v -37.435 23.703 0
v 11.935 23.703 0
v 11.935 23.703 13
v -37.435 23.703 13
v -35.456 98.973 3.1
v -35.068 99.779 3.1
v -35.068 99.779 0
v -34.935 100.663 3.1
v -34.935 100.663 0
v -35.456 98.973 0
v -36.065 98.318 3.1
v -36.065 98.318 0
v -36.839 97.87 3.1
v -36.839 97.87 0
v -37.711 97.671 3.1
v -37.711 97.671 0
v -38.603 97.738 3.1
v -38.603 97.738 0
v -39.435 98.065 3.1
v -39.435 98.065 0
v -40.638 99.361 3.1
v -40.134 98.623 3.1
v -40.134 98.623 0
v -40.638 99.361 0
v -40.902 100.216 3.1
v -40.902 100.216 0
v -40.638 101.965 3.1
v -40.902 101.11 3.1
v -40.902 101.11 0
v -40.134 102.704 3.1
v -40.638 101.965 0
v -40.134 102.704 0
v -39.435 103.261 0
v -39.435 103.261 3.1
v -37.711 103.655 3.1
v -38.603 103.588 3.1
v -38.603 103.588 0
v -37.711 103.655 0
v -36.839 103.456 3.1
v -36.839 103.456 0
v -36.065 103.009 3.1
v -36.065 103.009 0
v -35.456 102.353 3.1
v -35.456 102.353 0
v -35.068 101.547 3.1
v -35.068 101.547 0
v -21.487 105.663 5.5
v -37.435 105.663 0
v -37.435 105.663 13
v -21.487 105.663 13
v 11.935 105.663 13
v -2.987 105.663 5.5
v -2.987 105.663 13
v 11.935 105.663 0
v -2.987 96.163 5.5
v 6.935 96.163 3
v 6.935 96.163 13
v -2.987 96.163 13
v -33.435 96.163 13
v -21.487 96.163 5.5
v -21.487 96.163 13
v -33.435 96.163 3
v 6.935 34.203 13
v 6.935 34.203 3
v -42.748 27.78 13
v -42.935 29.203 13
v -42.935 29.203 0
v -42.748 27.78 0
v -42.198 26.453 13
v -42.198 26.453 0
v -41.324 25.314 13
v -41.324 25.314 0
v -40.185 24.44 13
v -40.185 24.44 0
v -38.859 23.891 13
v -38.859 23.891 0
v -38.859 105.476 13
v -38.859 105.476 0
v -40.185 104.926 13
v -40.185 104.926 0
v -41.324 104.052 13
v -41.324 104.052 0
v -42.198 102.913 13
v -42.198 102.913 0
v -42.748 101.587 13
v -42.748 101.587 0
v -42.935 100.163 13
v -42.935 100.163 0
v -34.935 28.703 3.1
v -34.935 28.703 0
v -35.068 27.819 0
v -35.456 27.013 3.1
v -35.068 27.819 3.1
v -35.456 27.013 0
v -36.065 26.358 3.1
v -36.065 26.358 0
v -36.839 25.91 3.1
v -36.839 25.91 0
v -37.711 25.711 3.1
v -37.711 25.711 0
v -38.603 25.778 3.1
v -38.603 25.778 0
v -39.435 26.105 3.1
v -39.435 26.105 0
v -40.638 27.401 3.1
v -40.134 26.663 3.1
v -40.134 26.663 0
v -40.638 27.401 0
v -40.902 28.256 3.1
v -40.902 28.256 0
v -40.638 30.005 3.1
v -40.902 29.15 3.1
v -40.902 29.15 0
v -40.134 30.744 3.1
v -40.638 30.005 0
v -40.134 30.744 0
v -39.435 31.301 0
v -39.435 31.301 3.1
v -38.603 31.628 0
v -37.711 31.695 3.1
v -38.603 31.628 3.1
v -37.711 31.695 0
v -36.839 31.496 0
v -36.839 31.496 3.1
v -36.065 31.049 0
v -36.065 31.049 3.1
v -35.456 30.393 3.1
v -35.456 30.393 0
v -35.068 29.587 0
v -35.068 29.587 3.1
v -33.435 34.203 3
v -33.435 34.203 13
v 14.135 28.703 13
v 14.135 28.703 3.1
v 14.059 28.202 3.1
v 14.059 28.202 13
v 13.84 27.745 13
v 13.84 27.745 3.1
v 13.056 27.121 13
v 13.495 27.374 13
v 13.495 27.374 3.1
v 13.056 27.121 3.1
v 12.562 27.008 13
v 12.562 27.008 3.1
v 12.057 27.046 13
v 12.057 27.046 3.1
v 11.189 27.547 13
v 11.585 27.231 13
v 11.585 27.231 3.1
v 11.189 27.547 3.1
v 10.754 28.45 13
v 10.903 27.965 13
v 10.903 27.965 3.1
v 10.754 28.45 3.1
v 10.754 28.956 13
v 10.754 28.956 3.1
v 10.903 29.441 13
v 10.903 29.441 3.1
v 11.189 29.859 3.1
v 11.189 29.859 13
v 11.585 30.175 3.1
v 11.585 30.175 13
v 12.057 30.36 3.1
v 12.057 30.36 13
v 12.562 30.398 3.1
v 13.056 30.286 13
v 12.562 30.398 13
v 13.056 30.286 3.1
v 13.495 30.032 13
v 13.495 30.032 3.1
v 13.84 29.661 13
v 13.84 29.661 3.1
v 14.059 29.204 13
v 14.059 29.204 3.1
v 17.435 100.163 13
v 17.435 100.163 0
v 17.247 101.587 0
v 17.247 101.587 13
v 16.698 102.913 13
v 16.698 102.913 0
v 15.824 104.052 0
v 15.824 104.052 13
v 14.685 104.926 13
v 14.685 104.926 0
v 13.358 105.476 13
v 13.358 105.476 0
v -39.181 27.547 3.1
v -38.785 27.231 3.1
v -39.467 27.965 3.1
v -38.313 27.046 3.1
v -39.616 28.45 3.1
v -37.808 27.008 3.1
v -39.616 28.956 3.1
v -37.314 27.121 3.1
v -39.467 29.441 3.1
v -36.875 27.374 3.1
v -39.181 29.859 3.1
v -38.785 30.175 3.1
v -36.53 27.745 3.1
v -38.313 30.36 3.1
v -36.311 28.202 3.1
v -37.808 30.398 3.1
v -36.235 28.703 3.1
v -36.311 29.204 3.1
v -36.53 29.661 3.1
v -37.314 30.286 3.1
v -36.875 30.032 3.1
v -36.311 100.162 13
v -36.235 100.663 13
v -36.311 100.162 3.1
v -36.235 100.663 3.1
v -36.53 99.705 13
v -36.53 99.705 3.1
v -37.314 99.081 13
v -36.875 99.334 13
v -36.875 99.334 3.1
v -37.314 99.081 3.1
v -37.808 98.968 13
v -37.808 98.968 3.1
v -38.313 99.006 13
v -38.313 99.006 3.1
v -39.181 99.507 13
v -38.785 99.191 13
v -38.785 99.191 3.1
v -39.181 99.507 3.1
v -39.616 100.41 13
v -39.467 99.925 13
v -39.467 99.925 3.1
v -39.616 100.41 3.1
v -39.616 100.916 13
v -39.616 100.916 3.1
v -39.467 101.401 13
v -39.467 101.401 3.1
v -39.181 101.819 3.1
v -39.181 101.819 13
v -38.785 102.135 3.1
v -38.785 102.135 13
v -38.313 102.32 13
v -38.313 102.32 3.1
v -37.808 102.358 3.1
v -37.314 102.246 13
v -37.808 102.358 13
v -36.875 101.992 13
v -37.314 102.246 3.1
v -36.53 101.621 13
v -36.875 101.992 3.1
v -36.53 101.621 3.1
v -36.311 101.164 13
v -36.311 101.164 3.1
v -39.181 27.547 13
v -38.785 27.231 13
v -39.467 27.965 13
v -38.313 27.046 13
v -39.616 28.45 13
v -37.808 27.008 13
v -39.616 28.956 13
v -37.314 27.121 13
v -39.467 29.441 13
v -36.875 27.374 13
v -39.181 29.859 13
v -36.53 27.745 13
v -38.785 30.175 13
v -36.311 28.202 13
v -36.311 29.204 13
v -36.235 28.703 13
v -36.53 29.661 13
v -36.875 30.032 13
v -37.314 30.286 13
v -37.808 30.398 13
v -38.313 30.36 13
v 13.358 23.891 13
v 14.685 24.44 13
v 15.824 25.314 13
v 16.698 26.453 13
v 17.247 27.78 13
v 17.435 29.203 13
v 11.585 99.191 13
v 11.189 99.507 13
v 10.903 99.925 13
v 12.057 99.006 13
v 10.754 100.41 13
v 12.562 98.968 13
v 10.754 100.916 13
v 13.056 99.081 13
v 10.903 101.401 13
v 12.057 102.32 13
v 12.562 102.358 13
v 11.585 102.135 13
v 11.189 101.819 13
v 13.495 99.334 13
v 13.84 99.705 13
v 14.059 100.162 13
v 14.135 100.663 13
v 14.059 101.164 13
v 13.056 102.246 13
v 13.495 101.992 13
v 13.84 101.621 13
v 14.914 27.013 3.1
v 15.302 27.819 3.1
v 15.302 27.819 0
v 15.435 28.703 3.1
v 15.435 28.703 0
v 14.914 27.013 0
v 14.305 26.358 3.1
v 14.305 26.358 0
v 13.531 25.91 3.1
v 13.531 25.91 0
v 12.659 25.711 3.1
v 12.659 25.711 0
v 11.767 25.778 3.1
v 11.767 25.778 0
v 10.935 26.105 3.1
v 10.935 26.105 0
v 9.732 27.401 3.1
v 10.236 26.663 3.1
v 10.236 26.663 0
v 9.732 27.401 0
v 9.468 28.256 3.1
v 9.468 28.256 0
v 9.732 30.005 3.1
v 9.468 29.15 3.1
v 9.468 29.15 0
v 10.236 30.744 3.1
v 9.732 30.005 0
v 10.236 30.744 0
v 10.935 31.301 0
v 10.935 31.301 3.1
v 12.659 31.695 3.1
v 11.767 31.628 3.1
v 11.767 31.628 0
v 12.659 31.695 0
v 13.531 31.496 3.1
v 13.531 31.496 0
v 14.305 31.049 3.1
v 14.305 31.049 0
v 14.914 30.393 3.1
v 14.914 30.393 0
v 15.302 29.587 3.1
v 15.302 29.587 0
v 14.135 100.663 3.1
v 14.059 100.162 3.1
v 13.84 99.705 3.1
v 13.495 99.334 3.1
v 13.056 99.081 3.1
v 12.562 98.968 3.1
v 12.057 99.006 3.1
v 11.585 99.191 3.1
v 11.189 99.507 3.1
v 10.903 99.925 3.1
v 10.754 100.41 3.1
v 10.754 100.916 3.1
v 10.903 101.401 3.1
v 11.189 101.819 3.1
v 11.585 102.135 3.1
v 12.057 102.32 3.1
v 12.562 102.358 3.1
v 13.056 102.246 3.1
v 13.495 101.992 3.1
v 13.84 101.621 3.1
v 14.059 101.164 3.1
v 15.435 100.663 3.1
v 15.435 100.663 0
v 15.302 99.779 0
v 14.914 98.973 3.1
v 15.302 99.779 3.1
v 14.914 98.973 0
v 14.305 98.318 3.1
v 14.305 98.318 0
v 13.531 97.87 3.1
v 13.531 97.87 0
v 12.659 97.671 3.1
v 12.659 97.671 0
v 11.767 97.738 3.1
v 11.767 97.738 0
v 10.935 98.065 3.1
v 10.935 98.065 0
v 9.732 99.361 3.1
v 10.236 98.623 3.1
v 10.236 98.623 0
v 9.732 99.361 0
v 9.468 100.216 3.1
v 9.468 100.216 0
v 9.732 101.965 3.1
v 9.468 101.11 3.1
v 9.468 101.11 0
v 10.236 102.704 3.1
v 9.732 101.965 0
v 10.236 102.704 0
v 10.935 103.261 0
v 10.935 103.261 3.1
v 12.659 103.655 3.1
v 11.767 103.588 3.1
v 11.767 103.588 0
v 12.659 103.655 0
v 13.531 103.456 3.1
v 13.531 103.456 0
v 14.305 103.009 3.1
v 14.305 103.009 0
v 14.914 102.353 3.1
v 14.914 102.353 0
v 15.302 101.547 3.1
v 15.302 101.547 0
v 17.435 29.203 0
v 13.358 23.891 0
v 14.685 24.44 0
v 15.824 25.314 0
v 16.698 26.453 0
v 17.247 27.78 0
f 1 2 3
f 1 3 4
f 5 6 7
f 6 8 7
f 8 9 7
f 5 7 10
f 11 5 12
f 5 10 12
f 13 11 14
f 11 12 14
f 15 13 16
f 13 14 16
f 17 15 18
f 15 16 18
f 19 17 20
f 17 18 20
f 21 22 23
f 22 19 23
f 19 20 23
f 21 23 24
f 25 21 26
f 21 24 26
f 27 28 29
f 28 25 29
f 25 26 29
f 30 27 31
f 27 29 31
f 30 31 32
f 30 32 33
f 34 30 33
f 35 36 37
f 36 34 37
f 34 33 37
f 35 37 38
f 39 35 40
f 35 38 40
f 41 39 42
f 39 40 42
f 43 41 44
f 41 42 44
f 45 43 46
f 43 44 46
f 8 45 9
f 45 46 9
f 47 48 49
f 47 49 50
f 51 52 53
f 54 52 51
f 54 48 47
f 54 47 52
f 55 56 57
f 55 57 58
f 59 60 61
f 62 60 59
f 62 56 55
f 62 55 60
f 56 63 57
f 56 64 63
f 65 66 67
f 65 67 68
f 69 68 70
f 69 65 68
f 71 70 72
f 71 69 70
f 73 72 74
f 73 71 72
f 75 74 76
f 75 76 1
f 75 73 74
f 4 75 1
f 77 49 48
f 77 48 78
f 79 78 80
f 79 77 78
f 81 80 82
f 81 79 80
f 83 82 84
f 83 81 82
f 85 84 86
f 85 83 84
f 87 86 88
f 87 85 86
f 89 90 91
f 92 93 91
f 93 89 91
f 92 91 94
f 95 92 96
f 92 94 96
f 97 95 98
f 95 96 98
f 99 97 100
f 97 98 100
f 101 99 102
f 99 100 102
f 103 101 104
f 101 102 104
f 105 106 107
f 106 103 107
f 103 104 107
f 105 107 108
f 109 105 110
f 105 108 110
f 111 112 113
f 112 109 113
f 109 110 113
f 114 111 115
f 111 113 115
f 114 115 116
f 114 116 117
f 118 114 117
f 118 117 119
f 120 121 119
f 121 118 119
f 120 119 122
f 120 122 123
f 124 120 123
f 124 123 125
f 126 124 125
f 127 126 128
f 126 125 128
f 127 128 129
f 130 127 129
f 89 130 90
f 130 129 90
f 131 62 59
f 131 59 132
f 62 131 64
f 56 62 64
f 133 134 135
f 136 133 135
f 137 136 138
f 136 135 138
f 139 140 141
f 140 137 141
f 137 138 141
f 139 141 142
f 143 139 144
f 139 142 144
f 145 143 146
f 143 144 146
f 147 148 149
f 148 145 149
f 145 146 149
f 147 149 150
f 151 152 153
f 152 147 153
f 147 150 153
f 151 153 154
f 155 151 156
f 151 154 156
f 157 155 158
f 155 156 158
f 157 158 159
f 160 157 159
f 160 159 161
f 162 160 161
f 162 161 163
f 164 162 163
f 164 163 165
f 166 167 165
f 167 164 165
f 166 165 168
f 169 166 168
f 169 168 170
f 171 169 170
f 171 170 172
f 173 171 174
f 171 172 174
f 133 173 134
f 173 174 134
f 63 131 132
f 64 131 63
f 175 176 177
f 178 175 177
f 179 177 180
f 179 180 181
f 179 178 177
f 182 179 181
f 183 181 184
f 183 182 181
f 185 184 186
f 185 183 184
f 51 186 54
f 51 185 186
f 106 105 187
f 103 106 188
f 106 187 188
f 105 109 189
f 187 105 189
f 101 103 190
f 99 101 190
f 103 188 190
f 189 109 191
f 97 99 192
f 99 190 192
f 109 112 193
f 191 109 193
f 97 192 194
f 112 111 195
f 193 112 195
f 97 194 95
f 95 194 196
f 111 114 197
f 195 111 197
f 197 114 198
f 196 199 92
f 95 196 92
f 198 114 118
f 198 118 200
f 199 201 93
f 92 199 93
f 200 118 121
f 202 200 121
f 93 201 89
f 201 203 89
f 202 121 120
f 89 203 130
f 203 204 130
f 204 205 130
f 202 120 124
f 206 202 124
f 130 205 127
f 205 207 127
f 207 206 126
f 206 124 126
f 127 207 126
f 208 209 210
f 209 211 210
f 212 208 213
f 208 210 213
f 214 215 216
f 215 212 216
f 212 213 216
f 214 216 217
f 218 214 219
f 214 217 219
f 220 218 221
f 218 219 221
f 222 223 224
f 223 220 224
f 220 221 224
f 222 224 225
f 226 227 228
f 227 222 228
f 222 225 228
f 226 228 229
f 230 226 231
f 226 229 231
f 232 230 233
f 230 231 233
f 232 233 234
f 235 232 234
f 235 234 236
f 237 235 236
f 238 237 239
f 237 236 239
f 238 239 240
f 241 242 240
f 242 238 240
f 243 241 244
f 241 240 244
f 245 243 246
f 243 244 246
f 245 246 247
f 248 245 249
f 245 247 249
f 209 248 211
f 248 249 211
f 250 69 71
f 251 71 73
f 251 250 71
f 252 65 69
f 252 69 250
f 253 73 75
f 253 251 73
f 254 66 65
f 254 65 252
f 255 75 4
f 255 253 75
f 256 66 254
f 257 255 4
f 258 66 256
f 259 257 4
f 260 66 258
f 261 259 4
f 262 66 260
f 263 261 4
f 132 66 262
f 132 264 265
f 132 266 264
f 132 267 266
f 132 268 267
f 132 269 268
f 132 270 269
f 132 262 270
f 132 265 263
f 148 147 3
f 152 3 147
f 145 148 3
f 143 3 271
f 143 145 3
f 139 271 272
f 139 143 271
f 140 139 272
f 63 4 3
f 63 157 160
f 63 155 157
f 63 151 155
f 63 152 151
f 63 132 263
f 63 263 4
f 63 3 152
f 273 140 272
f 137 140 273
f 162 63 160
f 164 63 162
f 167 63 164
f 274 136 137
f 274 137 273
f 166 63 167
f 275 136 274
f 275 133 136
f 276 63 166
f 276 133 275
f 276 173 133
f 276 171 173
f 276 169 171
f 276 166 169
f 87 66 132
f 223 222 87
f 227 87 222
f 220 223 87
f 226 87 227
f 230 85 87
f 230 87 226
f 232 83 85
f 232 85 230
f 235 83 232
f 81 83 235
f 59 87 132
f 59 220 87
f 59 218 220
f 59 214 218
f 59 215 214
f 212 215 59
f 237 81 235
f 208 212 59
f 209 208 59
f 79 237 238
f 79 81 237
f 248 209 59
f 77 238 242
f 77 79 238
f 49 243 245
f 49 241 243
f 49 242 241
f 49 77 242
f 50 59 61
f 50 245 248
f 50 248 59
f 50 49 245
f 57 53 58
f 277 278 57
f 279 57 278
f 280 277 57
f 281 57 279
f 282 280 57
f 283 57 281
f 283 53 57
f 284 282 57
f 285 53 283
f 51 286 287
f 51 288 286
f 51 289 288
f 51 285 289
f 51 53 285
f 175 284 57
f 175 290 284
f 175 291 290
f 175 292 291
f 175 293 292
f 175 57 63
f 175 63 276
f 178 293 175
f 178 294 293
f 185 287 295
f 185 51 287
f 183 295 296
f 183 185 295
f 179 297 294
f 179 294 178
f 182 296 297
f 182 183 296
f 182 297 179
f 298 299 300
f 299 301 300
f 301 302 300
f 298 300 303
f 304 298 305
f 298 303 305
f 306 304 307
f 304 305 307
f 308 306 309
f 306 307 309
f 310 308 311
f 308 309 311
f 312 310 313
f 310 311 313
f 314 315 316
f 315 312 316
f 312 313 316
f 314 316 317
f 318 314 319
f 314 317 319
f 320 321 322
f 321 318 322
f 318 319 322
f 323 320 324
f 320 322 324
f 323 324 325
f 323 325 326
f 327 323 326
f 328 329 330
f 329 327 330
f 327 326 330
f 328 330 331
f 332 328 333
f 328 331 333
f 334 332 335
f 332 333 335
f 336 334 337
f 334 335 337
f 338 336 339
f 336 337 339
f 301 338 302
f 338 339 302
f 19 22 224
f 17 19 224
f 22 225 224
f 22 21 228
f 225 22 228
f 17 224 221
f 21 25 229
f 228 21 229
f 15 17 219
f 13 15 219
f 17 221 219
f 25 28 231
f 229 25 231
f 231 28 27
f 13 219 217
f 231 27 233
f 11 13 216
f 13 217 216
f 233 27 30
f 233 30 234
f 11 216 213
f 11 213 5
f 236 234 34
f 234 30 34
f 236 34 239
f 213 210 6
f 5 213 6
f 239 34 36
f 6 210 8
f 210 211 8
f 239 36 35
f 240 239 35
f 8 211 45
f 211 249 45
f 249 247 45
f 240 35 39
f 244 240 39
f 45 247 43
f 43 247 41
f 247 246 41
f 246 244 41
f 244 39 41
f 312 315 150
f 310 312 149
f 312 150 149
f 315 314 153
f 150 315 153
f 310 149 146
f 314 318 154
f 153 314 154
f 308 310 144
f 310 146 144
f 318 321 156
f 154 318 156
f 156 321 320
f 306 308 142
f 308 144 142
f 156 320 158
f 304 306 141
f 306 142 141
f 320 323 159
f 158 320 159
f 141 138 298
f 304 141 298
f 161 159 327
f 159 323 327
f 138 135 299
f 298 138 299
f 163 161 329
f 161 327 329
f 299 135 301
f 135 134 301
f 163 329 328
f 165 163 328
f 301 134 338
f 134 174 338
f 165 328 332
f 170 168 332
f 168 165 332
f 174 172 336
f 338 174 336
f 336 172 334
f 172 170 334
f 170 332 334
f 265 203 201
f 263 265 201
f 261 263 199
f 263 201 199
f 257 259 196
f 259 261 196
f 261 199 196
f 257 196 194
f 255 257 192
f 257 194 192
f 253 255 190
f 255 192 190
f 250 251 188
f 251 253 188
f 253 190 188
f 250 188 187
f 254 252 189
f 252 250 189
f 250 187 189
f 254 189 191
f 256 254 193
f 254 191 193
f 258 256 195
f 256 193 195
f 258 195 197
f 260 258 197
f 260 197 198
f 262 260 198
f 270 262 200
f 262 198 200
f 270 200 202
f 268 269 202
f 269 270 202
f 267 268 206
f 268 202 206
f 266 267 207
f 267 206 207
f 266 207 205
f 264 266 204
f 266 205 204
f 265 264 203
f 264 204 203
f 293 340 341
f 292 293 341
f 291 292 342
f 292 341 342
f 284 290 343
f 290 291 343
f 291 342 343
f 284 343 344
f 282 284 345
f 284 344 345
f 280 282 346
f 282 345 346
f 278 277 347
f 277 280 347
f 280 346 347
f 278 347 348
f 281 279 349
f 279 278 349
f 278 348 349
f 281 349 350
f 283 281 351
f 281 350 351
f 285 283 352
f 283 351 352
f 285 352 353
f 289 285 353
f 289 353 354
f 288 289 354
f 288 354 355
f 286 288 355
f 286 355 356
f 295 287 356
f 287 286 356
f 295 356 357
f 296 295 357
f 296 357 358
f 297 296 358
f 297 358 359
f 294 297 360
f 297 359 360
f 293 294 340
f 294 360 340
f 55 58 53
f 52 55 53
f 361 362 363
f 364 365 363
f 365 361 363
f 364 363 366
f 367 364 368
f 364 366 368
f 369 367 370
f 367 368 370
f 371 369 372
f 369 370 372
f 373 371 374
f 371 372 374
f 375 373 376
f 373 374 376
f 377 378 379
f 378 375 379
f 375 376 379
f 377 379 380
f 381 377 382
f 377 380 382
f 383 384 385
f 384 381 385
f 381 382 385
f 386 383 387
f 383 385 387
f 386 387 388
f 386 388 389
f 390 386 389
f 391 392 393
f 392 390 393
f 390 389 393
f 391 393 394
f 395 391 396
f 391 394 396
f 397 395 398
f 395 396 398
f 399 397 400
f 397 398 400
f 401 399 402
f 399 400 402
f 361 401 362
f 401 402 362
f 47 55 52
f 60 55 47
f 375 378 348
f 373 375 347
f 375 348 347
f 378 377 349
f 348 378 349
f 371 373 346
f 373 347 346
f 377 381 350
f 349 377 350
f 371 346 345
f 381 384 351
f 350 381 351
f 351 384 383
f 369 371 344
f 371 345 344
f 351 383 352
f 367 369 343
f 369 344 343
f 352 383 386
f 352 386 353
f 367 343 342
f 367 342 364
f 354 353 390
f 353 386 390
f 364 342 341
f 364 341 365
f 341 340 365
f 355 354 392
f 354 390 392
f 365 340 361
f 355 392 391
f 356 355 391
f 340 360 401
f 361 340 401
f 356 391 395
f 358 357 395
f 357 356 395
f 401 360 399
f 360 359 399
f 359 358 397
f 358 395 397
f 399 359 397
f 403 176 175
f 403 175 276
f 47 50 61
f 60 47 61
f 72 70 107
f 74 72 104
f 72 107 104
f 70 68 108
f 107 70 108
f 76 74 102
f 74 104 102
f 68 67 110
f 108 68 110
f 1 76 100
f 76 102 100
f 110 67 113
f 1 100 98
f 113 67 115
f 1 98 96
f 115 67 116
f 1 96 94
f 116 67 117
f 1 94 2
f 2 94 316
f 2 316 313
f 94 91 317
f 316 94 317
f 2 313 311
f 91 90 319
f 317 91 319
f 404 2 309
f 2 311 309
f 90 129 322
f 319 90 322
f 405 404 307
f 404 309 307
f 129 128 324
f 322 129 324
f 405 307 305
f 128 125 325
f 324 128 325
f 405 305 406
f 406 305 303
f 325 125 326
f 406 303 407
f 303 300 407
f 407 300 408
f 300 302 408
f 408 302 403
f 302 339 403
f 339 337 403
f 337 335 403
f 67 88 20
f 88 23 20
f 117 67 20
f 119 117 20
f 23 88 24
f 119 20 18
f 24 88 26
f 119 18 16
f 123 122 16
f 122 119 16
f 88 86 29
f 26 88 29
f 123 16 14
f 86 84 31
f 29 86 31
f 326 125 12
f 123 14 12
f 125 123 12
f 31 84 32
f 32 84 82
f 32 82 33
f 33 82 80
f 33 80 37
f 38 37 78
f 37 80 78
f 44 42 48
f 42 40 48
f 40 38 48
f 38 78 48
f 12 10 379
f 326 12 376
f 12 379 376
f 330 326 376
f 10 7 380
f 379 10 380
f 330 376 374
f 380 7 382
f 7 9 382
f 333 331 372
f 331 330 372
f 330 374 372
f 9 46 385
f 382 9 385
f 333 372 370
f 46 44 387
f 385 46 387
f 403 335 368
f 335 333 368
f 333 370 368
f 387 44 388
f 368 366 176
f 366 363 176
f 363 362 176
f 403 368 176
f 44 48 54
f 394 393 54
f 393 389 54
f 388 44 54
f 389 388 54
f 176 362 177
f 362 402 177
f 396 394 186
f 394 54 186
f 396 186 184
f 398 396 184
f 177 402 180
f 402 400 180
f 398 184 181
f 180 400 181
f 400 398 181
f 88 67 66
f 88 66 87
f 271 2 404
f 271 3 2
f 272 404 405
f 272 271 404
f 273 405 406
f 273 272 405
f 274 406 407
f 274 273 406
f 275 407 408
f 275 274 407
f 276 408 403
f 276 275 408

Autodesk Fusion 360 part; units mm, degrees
sketch "Sketch1" plane through (0, 0, 0) normal (0, 0, 1) x (1, 0, 0) in component "Jackson's Editing ATK"
  line L0 (-33.4351, 34.2031) -> (6.9349, 34.2031)
  line L1 (6.9349, 34.2031) -> (6.9349, 96.1631)
  line L2 (6.9349, 96.1631) -> (-33.4351, 96.1631)
  line L3 (-33.4351, 96.1631) -> (-33.4351, 34.2031)
  line L4 (-42.9351, 105.6631) -> (17.4349, 105.6631)
  line L5 (17.4349, 105.6631) -> (17.4349, 23.7031)
  line L6 (17.4349, 23.7031) -> (-42.9351, 23.7031)
  line L7 (-42.9351, 23.7031) -> (-42.9351, 105.6631)
  circle A0 centre (-37.9351, 28.7031) radius 1.7
  circle A1 centre (-37.9351, 28.7031) radius 3
  circle A2 centre (12.4349, 28.7031) radius 1.7
  circle A3 centre (12.4349, 28.7031) radius 1.7
  circle A4 centre (12.4349, 28.7031) radius 3
  circle A5 centre (12.4349, 100.6631) radius 1.7
  circle A6 centre (12.4349, 100.6631) radius 3
  circle A7 centre (-37.9351, 100.6631) radius 1.7
  circle A8 centre (-37.9351, 100.6631) radius 3
  dimension "d1" = 61.96
  dimension "d2" = 40.37
  dimension "d3" = 60.37
  dimension "d4" = 81.96
  dimension "d5" = 9.5
  dimension "d6" = 9.5
  dimension "d7" = 3.4
  dimension "d8" = 5
  dimension "d9" = 5
  dimension "d17" = 6
  dimension "d20" = 3.4
  dimension "d21" = 5
  dimension "d22" = 5
  dimension "d23" = 3.4
  dimension "d24" = 6
  dimension "d25" = 3.4
  dimension "d26" = 5
  dimension "d27" = 5
  dimension "d28" = 6
  dimension "d29" = 3.4
  dimension "d30" = 5
  dimension "d31" = 5
  dimension "d32" = 6
extrude "Extrude1" add sketch "Sketch1" along normal blind 9.9 from surface at 3.1 contours A1 | A4 | A6 | A8 makes body 1 at (-34.9388, 28.5536, 9.7) makes body 2 at (-35.3752, 102.2274, 9.7) makes body 3 at (15.4312, 28.5536, 9.7) makes body 4 at (15.254, 99.6371, 9.7) in component "Jackson's Editing ATK"
extrude "Extrude2" add sketch "Sketch1" along normal blind 13 contours L4 L5 L6 L7 bodies 1 2 3 4 in component "Jackson's Editing ATK"
extrude "Extrude3" add sketch "Sketch1" along normal blind 3 contours L0 L1 L2 L3 bodies 1 in component "Jackson's Editing ATK"
sketch "Sketch2" plane through (0, 0, 13) normal (0, 0, 1) x (-1, 0, 0) in component "Jackson's Editing ATK"
  circle A0 centre (37.9351, -28.7031) radius 1.7
  circle A1 centre (-12.4349, -100.6631) radius 1.7
  line L0 (33.4351, -34.2031) -> (33.4351, -96.1631)
  line L1 (33.4351, -96.1631) -> (-6.9349, -96.1631)
  line L2 (-6.9349, -96.1631) -> (-6.9349, -34.2031)
  line L3 (-6.9349, -34.2031) -> (33.4351, -34.2031)
  line L4 (42.9351, -23.7031) -> (-17.4349, -23.7031)
  line L5 (-17.4349, -23.7031) -> (-17.4349, -105.6631)
  line L6 (-17.4349, -105.6631) -> (42.9351, -105.6631)
  line L7 (42.9351, -105.6631) -> (42.9351, -23.7031)
  circle A2 centre (37.9351, -100.6631) radius 1.7
  circle A3 centre (-12.4349, -28.7031) radius 1.7
  line L8 (21.4871, -96.1631) -> (2.9871, -96.1631)
  line L9 (2.9871, -96.1631) -> (2.9871, -105.6631)
  line L10 (2.9871, -105.6631) -> (21.4871, -105.6631)
  line L11 (21.4871, -105.6631) -> (21.4871, -96.1631)
  dimension "d40" = 21.448
  dimension "d41" = 18.5
extrude "Extrude4" cut sketch "Sketch2" against normal blind 7.5 contours L1 L6 L8 L9 L10 L11 bodies 1 in component "Jackson's Editing ATK"
fillet "Fillet1" radius 5.5 1 edges at (-42.9351, 23.7031, 6.5) on bodies 1 in component "Jackson's Editing ATK"
fillet "Fillet2" radius 5.5 1 edges at (17.4349, 23.7031, 6.5) on bodies 1 in component "Jackson's Editing ATK"
fillet "Fillet3" radius 5.5 1 edges at (17.4349, 105.6631, 6.5) on bodies 1 in component "Jackson's Editing ATK"
fillet "Fillet4" radius 5.5 1 edges at (-42.9351, 105.6631, 6.5) on bodies 1 in component "Jackson's Editing ATK"
component "Jackson's Editing ATK" placed x (1, 0, 0) y (0, 1, 0) z (0, 0, 1) at (0, 0, 0)
